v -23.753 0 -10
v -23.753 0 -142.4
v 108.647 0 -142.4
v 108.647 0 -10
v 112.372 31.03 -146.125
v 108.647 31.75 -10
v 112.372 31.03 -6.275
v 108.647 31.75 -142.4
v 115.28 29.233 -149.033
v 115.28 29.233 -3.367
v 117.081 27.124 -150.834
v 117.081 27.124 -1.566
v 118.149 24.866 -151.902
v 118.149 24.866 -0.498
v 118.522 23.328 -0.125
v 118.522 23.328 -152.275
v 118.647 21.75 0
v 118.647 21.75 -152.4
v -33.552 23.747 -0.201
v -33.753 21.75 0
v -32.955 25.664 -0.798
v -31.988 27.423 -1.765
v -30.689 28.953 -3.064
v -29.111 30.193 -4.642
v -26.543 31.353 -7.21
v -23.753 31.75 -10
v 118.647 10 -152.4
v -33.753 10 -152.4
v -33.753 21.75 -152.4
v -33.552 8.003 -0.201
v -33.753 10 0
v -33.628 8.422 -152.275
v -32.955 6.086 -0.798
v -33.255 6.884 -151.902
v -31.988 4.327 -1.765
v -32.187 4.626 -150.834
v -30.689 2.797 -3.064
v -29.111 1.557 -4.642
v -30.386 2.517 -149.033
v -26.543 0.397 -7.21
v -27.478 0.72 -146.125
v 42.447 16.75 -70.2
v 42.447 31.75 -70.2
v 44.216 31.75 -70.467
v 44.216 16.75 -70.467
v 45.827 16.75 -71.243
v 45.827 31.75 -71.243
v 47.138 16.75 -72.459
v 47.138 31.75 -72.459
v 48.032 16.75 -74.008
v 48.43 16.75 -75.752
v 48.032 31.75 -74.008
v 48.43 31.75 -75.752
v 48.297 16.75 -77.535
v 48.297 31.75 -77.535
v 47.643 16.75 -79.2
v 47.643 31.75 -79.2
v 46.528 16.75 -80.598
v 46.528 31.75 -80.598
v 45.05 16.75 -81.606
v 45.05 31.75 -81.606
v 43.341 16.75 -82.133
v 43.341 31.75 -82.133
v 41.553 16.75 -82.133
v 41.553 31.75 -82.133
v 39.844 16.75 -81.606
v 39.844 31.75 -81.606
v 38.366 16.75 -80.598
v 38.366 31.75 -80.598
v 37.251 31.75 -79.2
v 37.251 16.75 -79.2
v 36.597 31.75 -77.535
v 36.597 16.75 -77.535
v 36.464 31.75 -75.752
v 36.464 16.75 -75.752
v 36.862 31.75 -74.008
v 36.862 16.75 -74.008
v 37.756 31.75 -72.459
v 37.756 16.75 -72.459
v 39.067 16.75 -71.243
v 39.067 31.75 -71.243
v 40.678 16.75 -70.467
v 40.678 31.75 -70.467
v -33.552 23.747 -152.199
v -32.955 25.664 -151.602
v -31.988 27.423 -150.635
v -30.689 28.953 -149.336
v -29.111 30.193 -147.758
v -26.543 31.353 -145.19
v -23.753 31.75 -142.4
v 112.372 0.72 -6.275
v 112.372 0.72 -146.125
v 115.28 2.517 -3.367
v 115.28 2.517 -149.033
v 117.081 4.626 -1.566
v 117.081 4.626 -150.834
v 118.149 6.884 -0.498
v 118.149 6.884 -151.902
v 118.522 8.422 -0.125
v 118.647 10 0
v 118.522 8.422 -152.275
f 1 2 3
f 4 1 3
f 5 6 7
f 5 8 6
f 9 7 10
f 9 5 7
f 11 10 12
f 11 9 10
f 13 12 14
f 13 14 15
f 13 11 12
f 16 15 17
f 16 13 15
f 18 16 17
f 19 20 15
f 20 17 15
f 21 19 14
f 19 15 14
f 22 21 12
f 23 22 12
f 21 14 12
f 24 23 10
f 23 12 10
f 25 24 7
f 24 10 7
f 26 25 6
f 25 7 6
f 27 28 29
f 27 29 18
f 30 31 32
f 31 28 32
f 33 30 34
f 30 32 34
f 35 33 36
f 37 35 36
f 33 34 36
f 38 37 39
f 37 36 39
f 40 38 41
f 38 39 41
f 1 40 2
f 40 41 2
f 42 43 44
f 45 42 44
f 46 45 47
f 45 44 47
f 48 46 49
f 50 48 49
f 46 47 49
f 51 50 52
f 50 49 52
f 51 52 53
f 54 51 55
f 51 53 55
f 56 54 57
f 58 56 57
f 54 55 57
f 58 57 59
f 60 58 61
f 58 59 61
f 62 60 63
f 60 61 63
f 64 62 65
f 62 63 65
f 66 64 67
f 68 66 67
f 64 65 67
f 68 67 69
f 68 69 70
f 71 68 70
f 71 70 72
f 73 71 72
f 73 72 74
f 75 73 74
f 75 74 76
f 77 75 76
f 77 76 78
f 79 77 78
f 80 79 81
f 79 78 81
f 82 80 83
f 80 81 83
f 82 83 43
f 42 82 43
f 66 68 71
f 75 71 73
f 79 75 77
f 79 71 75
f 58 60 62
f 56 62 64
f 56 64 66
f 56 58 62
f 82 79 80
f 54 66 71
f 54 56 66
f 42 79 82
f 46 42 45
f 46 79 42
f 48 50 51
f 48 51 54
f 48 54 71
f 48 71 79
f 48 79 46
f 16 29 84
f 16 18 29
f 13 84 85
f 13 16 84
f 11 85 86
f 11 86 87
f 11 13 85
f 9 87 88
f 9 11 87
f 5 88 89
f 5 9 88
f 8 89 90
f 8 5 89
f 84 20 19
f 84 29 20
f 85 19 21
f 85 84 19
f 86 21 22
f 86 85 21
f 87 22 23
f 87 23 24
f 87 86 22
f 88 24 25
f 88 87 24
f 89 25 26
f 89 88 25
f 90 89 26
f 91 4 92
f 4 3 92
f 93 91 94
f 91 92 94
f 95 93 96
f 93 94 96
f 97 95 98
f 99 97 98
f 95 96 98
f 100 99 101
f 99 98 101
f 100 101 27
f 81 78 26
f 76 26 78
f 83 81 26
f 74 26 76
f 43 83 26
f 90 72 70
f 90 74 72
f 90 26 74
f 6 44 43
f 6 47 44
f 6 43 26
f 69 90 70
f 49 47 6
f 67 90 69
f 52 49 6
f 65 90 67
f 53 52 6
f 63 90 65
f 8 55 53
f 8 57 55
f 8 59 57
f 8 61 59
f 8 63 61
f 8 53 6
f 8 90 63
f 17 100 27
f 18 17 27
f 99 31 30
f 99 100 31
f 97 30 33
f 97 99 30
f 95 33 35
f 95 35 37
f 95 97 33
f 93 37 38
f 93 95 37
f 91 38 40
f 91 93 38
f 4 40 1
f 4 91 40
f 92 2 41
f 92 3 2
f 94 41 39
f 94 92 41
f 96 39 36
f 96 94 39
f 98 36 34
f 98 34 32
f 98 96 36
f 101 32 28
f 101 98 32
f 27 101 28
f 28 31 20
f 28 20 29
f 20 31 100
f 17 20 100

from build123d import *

# Parameters (mm, degrees)
SKETCH1_W           = 152.4
SKETCH1_H           = 152.4
BOSS_EXTRUDE1_DEPTH = 31.75
SKETCH2_R           = 6
CUT_EXTRUDE1_DEPTH  = 15
FILLET1_R           = 10
FILLET2_R           = 10


with BuildPart() as part:
    # Sketch1 → Boss-Extrude1 (new body)
    with BuildSketch(Plane(origin=(0, 0, 0), x_dir=(1, 0, 0), z_dir=(0, 1, 0))):
        with Locations((42.446979866, 76.2)):
            Rectangle(SKETCH1_W, SKETCH1_H)
    extrude(amount=BOSS_EXTRUDE1_DEPTH)

    # Sketch2 → Cut-Extrude1 (cut)
    with BuildSketch(Plane(origin=(0, 31.75, 0), x_dir=(1, 0, 0), z_dir=(0, 1, 0))):
        with Locations(Location((42.446979866, 76.2, 0), (0, 0, 270))):
            Circle(SKETCH2_R)
    extrude(amount=-CUT_EXTRUDE1_DEPTH, mode=Mode.SUBTRACT)

    # Fillet1
    fillet1_edges = [part.edges().sort_by_distance(p)[0] for p in [
        (118.646979866, 31.75, -76.2),
        (42.446979866, 31.75, -152.4),
        (-33.753020134, 31.75, -76.2),
        (42.446979866, 31.75, 0),
    ]]
    fillet(fillet1_edges, radius=FILLET1_R)

    # Fillet2
    fillet2_edges = [part.edges().sort_by_distance(p)[0] for p in [
        (42.446979866, 0, -152.4),
        (118.646979866, 0, -76.2),
        (42.446979866, 0, 0),
        (-33.753020134, 0, -76.2),
    ]]
    fillet(fillet2_edges, radius=FILLET2_R)


solid = part.part
